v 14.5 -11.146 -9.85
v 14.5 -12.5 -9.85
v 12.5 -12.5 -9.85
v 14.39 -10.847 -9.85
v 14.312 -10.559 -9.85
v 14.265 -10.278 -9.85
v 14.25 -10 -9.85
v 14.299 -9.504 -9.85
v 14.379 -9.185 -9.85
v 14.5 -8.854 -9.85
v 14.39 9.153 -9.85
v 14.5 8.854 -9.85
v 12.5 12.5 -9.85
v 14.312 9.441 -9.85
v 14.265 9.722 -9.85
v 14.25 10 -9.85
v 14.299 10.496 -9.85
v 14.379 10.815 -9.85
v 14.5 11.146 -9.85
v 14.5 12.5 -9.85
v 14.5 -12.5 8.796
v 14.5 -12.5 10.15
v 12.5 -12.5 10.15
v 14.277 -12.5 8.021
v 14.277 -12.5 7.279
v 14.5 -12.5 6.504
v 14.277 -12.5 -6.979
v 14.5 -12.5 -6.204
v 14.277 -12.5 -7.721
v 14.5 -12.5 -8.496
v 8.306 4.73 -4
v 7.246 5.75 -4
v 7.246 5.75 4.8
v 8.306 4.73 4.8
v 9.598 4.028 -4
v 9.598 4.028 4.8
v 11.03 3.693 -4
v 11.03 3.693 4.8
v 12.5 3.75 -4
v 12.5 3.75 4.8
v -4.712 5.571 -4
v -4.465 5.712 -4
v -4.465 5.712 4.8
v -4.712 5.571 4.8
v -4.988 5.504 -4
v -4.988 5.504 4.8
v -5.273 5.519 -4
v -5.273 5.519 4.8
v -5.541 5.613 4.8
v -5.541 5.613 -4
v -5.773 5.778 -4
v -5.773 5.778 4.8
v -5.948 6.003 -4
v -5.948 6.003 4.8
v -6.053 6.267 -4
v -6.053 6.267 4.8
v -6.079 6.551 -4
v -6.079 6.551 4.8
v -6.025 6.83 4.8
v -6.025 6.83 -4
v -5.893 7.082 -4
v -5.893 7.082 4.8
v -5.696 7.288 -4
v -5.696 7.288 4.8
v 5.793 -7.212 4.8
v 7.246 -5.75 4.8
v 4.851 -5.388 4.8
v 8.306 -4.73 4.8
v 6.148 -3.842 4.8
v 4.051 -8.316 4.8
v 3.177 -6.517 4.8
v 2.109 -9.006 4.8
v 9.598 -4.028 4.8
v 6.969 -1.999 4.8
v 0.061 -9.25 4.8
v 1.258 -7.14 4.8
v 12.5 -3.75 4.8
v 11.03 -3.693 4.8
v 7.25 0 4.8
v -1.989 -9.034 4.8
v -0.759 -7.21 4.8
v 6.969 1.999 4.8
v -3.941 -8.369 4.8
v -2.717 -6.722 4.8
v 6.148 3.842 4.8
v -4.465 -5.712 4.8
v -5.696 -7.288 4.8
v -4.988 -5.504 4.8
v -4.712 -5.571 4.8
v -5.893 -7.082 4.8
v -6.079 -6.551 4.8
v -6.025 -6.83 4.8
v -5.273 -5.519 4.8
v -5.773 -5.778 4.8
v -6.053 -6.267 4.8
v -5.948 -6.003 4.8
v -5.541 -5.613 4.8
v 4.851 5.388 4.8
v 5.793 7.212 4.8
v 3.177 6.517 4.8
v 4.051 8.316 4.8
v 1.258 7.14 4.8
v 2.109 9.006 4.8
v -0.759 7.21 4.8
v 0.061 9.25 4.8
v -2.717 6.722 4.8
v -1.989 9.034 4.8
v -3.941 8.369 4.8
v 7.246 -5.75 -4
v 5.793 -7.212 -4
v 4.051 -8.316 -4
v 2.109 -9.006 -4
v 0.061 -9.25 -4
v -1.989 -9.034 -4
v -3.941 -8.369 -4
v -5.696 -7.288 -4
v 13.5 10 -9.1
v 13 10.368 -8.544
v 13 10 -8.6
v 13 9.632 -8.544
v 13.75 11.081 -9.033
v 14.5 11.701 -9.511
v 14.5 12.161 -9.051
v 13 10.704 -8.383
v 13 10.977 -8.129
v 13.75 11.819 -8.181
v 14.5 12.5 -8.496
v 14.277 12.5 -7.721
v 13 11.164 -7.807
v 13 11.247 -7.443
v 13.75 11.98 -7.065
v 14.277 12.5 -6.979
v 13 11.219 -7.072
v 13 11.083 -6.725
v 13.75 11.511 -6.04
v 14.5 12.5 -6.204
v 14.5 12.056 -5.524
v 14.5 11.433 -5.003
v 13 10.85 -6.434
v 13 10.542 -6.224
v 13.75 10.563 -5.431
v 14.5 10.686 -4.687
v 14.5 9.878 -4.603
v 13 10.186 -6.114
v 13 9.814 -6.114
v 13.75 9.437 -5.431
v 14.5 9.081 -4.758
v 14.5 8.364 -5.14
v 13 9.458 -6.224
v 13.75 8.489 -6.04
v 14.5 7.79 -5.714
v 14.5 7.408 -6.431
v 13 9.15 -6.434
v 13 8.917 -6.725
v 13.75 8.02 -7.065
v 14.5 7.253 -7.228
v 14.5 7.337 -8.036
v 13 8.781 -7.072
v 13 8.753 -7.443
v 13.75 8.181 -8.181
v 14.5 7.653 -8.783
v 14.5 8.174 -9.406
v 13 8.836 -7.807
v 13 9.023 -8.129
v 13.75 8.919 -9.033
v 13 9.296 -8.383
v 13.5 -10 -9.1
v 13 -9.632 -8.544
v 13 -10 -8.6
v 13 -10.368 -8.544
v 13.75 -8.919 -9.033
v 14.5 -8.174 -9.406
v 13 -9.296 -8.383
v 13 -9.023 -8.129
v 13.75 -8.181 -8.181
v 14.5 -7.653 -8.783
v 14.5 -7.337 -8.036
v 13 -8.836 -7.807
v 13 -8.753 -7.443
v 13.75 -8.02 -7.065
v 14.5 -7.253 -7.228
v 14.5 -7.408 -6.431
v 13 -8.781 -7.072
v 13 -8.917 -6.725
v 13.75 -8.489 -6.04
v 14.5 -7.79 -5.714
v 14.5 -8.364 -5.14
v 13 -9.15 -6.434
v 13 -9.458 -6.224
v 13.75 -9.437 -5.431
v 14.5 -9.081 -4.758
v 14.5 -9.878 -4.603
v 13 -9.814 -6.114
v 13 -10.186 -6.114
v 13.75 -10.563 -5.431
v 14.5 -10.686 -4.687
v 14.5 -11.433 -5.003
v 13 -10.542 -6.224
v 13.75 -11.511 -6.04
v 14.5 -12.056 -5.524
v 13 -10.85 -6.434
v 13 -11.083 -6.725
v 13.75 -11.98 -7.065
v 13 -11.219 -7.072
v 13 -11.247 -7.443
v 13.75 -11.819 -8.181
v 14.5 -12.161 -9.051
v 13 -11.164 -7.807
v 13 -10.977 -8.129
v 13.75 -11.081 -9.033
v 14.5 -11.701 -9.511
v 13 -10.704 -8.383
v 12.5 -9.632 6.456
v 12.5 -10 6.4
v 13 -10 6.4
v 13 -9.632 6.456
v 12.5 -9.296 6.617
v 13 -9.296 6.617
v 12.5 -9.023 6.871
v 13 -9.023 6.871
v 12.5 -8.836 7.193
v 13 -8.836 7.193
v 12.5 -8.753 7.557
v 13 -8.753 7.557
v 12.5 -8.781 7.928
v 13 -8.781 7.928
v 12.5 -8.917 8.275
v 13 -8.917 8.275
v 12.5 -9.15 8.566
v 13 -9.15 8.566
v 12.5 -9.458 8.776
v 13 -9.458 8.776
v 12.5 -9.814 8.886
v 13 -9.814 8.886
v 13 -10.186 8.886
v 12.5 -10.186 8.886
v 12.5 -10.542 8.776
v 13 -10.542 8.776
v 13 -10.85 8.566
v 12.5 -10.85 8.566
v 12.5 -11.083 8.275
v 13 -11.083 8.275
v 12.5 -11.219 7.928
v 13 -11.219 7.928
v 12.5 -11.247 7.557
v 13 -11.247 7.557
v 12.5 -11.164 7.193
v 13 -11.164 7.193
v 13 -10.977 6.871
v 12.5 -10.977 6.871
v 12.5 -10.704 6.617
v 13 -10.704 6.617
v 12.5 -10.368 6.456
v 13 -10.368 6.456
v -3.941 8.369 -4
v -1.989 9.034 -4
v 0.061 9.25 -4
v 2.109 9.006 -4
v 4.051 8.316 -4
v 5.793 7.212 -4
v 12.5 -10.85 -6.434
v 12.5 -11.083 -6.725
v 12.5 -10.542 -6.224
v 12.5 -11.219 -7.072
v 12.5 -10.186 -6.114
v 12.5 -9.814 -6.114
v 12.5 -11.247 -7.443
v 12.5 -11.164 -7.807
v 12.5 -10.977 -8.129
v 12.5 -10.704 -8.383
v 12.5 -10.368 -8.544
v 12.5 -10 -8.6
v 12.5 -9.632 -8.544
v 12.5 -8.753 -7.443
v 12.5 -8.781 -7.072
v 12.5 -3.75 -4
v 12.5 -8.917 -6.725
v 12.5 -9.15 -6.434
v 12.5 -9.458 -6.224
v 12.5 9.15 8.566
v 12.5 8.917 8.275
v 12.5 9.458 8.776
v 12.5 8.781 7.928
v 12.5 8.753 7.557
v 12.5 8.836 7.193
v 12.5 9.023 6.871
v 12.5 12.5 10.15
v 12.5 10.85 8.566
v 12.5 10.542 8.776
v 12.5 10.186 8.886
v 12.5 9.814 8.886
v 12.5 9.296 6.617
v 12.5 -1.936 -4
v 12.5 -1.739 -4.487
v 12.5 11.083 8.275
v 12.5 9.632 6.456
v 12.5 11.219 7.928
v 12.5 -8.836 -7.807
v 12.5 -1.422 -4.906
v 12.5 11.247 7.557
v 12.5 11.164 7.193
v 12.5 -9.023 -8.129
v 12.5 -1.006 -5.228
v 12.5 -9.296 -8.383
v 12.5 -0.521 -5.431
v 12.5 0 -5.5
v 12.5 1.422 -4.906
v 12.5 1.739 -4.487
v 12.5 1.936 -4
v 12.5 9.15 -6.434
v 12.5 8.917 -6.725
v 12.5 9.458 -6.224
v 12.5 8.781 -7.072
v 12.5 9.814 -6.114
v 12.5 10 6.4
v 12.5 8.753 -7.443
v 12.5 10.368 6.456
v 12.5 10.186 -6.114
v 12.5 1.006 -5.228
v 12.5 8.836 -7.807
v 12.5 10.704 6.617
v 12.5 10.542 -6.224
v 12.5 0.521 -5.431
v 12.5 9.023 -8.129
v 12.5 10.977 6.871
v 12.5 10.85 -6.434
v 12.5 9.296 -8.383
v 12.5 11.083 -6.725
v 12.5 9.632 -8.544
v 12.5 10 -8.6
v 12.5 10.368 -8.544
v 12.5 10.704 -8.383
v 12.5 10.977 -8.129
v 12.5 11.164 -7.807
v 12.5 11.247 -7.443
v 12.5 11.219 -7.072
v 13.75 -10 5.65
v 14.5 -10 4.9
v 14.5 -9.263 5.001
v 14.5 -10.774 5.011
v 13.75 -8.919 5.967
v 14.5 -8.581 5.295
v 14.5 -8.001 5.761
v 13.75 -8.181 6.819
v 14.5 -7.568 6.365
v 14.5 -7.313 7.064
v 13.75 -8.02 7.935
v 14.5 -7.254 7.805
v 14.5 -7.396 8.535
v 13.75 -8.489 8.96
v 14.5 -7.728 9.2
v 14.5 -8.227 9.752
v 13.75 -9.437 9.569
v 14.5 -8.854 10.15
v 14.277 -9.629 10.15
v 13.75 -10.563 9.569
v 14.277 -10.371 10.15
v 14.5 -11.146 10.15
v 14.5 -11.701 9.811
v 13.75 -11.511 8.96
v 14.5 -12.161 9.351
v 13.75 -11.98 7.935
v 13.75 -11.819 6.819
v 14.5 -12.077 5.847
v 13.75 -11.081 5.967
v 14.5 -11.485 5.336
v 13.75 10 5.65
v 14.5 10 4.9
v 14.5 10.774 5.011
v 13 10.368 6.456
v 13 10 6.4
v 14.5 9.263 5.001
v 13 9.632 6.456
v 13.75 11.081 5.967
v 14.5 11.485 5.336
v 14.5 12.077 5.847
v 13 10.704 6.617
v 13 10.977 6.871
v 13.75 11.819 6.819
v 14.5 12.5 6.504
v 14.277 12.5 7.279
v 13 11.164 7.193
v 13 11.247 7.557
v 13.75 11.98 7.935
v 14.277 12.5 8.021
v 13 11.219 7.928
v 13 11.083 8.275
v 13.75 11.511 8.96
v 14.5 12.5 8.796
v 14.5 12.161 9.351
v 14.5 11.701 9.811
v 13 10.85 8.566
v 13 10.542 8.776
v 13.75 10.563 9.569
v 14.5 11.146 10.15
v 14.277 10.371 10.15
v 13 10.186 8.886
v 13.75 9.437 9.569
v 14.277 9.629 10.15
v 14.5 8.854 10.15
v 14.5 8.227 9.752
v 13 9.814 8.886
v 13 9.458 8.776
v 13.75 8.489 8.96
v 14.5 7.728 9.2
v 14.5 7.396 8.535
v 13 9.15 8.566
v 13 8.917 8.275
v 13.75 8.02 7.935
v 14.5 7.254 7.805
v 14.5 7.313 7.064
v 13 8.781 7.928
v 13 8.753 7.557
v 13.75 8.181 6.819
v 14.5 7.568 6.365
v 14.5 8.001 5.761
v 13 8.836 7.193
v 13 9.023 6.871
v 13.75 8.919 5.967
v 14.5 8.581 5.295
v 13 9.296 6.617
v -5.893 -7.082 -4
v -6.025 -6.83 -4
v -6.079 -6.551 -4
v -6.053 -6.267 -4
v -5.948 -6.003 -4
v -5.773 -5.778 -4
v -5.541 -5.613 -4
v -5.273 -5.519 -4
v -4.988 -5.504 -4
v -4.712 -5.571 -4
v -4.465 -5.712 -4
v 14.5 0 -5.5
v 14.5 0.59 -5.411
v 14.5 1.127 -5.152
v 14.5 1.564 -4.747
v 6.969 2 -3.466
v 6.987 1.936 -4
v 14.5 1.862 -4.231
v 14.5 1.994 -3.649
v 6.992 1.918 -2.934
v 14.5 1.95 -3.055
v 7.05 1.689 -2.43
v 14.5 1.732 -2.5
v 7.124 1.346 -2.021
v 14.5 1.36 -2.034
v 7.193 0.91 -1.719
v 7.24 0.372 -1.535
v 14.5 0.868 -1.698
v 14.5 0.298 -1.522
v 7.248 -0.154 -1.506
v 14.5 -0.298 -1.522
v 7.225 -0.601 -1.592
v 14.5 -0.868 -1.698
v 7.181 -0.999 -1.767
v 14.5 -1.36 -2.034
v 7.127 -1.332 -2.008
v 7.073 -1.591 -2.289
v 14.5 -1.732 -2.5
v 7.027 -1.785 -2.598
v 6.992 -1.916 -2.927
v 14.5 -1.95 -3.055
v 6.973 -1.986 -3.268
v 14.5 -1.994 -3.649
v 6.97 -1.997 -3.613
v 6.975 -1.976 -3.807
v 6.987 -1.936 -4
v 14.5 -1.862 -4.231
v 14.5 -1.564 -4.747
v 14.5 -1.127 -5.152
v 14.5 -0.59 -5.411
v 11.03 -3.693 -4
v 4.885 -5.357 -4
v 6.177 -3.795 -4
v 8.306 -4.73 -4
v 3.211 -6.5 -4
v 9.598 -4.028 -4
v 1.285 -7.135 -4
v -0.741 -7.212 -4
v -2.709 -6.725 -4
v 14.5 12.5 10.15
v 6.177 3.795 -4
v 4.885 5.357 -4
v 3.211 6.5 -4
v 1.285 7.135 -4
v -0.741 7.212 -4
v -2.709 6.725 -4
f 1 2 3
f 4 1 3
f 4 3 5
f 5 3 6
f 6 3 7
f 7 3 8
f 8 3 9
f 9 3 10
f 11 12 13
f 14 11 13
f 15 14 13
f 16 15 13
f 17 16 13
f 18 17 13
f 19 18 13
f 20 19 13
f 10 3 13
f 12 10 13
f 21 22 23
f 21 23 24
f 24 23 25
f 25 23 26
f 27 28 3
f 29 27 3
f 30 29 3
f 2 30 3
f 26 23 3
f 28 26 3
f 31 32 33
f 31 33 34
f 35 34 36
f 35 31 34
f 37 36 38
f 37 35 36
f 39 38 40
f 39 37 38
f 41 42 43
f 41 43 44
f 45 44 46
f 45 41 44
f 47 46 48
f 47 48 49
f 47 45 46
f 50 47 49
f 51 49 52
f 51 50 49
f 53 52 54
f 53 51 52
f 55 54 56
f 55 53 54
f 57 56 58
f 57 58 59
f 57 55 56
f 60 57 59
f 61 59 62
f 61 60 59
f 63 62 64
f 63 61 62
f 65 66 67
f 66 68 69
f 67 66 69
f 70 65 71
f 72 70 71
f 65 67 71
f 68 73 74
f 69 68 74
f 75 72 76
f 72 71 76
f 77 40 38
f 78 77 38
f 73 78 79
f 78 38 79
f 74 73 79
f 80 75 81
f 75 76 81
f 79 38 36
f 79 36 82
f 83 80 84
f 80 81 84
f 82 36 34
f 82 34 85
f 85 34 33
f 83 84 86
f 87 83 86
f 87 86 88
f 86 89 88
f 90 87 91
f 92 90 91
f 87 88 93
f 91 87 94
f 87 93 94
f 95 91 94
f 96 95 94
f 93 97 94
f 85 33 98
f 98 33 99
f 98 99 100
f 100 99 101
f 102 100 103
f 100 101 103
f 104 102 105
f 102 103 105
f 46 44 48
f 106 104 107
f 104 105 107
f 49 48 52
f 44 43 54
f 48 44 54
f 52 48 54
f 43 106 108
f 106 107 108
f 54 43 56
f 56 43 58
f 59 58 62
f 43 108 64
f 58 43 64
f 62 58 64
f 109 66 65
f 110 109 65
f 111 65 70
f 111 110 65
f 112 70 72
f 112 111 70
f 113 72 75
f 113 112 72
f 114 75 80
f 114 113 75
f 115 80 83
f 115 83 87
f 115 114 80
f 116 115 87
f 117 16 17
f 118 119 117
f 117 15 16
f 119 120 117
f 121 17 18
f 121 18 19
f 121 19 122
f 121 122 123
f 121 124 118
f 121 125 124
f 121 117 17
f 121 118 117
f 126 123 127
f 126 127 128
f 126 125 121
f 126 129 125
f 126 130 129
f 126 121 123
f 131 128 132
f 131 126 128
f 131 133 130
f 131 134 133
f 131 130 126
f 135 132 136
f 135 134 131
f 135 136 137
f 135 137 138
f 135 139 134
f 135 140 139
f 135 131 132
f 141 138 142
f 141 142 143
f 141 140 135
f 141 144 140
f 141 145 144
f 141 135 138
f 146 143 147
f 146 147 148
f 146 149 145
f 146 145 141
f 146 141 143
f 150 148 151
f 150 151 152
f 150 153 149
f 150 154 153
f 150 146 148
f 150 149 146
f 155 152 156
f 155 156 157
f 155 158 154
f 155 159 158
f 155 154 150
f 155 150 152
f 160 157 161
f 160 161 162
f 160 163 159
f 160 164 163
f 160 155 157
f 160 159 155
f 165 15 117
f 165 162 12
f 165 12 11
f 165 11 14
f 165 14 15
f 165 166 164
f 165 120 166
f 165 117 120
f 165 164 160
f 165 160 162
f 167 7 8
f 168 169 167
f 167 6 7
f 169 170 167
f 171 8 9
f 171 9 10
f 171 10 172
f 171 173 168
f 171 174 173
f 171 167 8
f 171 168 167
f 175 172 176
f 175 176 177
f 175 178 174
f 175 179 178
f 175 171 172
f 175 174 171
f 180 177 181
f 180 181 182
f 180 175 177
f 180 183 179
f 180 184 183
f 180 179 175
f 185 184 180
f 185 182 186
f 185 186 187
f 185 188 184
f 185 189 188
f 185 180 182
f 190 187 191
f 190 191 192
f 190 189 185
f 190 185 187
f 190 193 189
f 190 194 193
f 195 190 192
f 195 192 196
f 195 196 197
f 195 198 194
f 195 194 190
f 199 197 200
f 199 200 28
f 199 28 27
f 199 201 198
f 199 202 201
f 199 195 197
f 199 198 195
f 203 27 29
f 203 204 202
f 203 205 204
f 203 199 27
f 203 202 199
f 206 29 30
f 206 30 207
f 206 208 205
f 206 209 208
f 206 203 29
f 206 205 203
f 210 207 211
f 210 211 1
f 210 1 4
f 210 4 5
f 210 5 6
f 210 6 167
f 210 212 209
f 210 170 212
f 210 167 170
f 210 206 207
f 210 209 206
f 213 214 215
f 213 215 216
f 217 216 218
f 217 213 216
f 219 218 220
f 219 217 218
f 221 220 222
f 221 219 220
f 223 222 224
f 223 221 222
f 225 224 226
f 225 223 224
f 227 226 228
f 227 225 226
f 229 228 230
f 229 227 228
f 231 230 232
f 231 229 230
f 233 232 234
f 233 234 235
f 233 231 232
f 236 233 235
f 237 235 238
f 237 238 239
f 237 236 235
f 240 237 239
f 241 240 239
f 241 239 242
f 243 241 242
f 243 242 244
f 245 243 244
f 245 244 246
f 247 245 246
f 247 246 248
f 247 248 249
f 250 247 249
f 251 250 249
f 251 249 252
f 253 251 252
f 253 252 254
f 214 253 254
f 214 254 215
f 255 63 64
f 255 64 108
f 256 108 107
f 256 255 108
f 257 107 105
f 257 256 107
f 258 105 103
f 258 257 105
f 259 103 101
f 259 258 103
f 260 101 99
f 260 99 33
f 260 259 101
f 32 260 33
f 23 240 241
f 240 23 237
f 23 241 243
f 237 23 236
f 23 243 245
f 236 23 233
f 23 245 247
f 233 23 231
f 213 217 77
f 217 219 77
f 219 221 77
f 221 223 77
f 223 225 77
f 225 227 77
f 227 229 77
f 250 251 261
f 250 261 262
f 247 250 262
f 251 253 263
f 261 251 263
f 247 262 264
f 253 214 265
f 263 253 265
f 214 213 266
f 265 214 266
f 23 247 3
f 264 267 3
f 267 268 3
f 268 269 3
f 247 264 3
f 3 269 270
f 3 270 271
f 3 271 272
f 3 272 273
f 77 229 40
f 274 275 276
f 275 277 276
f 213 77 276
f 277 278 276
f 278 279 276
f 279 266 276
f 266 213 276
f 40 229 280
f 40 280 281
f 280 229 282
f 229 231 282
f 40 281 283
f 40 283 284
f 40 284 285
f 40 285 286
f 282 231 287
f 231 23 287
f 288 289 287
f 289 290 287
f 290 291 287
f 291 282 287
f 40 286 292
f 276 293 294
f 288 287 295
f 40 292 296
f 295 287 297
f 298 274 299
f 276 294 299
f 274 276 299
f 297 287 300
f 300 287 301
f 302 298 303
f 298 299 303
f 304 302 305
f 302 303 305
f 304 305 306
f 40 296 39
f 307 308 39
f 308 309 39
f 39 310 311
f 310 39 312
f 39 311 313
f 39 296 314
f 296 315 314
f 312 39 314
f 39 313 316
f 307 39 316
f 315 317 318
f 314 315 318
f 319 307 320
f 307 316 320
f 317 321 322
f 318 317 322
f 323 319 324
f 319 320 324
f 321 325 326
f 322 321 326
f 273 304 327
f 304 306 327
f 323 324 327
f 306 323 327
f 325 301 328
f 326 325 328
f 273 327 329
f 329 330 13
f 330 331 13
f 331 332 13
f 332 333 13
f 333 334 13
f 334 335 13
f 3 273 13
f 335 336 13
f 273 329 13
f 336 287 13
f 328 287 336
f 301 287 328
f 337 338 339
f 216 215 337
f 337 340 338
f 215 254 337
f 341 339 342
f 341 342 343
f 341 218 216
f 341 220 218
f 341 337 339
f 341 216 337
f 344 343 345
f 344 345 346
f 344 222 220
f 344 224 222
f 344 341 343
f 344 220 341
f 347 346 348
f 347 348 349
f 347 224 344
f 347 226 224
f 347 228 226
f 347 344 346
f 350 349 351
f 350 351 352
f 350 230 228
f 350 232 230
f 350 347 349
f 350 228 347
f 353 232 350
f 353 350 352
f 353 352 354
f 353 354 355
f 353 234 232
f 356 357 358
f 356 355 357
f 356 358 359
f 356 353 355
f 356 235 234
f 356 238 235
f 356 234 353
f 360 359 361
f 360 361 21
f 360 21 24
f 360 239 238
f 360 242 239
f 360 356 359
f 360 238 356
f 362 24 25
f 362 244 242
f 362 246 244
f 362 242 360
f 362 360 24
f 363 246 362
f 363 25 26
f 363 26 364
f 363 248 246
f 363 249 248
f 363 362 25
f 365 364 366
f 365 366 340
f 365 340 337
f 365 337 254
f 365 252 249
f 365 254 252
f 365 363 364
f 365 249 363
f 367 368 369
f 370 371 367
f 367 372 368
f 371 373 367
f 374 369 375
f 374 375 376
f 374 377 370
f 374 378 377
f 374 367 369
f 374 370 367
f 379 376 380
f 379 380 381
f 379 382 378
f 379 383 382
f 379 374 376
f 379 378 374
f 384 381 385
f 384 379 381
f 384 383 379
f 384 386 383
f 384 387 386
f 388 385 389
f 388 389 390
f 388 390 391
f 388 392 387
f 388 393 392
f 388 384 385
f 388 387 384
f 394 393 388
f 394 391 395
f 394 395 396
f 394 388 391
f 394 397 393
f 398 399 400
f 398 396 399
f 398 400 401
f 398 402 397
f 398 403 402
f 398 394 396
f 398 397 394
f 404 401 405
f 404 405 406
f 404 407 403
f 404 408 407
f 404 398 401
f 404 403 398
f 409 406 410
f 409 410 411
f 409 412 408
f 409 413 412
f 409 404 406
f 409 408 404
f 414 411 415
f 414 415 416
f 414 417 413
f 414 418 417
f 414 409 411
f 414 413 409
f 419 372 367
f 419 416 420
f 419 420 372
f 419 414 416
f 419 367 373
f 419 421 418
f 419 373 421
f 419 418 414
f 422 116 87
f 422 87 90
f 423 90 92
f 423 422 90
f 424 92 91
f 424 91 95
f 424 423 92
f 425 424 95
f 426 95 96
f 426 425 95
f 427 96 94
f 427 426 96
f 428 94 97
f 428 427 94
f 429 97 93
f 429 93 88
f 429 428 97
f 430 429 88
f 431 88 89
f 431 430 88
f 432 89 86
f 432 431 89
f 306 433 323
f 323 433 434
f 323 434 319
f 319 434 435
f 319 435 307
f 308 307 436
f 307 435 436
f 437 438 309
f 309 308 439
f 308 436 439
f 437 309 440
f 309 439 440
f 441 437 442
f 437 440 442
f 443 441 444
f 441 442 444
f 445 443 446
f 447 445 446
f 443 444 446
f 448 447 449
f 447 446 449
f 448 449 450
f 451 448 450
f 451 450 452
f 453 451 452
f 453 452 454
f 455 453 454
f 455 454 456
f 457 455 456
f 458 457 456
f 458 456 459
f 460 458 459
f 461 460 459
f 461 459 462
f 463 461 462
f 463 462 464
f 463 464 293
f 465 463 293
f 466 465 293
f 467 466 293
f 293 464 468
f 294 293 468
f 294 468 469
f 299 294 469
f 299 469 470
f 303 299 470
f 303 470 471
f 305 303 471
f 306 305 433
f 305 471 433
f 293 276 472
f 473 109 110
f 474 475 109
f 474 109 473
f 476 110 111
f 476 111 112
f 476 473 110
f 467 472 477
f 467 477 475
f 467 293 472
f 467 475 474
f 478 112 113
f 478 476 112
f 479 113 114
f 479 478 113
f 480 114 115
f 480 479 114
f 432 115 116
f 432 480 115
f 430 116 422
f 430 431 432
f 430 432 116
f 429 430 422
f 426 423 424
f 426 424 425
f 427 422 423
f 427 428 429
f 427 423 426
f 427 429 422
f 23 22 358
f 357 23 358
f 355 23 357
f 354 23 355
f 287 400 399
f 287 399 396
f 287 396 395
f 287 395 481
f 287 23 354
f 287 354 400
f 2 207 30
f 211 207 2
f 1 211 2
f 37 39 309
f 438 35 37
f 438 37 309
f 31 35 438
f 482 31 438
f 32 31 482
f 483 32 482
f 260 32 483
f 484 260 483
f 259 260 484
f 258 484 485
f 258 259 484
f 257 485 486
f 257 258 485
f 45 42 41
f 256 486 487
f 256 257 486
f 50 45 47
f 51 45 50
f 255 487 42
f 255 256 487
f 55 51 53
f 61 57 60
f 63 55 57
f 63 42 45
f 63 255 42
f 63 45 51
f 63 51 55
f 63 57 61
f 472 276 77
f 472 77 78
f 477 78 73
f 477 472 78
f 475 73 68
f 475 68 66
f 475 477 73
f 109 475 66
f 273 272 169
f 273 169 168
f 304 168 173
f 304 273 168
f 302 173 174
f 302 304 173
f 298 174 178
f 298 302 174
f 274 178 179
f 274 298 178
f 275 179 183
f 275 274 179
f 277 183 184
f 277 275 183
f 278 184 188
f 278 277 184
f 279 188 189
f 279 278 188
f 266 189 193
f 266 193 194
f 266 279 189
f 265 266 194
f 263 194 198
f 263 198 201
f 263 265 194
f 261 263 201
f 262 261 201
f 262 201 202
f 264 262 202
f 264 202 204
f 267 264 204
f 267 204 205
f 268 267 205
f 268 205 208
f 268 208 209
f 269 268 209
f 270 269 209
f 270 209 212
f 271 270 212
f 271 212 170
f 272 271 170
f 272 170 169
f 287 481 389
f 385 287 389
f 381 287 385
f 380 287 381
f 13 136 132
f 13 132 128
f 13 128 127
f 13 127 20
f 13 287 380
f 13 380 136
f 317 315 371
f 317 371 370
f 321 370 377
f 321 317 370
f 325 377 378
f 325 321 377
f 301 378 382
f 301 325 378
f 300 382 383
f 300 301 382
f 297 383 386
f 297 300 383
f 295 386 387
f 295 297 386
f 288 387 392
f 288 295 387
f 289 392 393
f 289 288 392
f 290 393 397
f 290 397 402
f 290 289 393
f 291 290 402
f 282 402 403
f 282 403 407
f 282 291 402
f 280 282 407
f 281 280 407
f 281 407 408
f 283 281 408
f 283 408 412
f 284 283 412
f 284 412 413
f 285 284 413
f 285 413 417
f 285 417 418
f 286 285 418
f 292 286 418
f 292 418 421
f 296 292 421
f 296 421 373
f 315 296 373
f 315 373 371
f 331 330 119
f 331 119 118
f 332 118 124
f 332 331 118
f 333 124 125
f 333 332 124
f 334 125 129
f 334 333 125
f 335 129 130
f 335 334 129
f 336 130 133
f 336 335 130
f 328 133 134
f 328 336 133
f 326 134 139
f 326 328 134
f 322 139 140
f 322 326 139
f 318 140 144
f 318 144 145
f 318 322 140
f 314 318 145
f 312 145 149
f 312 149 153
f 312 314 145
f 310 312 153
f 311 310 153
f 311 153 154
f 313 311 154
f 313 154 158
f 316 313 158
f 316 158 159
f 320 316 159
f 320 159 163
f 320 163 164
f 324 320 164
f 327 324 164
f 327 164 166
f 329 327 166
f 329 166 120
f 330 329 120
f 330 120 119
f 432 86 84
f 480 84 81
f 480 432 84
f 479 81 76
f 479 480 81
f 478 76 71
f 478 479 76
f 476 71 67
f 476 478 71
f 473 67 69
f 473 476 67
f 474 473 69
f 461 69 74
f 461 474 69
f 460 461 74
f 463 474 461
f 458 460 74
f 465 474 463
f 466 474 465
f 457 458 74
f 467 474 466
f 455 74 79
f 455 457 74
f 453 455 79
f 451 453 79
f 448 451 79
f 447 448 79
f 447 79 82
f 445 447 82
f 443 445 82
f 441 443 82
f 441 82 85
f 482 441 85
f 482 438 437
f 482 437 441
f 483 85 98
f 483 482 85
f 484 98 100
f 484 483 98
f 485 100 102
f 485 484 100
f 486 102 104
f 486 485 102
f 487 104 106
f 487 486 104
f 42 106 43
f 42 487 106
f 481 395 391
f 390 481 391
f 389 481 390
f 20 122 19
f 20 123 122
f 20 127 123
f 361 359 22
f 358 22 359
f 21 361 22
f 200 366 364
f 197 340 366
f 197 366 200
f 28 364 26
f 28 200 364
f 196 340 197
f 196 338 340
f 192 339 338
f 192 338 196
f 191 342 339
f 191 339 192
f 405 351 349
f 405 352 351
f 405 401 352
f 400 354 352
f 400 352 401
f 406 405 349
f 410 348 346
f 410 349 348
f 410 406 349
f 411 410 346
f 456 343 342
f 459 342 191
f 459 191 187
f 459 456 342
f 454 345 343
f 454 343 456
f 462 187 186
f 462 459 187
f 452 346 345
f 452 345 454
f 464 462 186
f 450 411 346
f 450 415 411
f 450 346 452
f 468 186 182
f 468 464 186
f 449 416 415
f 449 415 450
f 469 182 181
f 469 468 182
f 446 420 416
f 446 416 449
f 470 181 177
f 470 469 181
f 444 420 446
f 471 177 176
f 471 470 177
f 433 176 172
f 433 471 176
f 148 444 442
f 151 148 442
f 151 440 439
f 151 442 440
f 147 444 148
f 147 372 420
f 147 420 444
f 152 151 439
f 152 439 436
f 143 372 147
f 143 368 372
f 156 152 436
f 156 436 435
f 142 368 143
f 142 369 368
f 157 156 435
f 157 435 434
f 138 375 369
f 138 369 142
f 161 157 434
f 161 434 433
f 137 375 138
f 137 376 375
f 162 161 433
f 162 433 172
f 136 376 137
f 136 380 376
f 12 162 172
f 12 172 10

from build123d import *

# Parameters (mm, degrees)
EXTRUDE_5_DEPTH        = 4.8
EXTRUDE_5_DEPTH_BACK   = 4
EXTRUDE_START          = -4
EXTRUDE_902_DEPTH      = 8.8
SKETCH_8_W             = 20
SKETCH_8_H             = 25
SKETCH_8_R             = 1.25
EXTRUDE_2674_DEPTH     = 2
CHAMFER_2_SIZE         = 1.5
CUT_EXTRUDE_2965_REACH = 28.131
SKETCH_9_R             = 2


with BuildPart() as part:
    # Эскиз1 → Выталкивающая часть (С ПАЗАМИ В ОБЕ СТОРОНЫ ВЫДАВИТЬ НА 5ММ) (new, two sides: drawn at the far end of the back side and taken through both)
    with BuildSketch(Plane.XY.offset(-EXTRUDE_5_DEPTH_BACK)):
        with BuildLine():
            ThreePointArc((-4.464770012, -5.712121212), (7.25, 0), (-4.464770012, 5.712121212))
            ThreePointArc((-4.464770012, 5.712121212), (-5.868479146, 5.884169654), (-5.696430705, 7.287878788))
            ThreePointArc((-5.696430705, 7.287878788), (9.25, 0), (-5.696430705, -7.287878788))
            ThreePointArc((-5.696430705, -7.287878788), (-5.868479146, -5.884169654), (-4.464770012, -5.712121212))
        make_face()
    extrude(amount=EXTRUDE_5_DEPTH + EXTRUDE_5_DEPTH_BACK)

    # Эскиз2 → Extrude 902 (add)
    with BuildSketch(Plane.XY.offset(EXTRUDE_START)):
        with BuildLine():
            Line((12.5, 3.75), (12.5, -3.75))
            ThreePointArc((12.5, -3.75), (9.598284348, -4.027802018), (7.246080423, -5.749505936))
            ThreePointArc((7.246080423, -5.749505936), (9.25, 0), (7.246080423, 5.749505936))
            ThreePointArc((7.246080423, 5.749505936), (9.598284348, 4.027802018), (12.5, 3.75))
        make_face()
    extrude(amount=EXTRUDE_902_DEPTH)

    # Эскиз8 → Extrude 2674 (add)
    with BuildSketch(Plane(origin=(12.5, 0, 0), x_dir=(0, 0, -1), z_dir=(1, 0, 0))):
        with Locations((-0.15, 0)):
            Rectangle(SKETCH_8_W, SKETCH_8_H)
        with Locations((-7.65, 10)):
            Circle(SKETCH_8_R, mode=Mode.SUBTRACT)
        with Locations((-7.65, -10)):
            Circle(SKETCH_8_R, mode=Mode.SUBTRACT)
        with Locations((7.35, -10)):
            Circle(SKETCH_8_R, mode=Mode.SUBTRACT)
        with Locations((7.35, 10)):
            Circle(SKETCH_8_R, mode=Mode.SUBTRACT)
    extrude(amount=EXTRUDE_2674_DEPTH)

    # Фаска2
    # the kernel refuses this chamfer: 1.5 mm, written as the material it takes off along each edge
    with BuildSketch(Plane(origin=(14.5, -10, -7.35), x_dir=(0, 0, -1), z_dir=(0, -1, 0))) as chamfer_2_piece_1:
        Polygon((1.25 + CHAMFER_2_SIZE, 0), (1.25, -CHAMFER_2_SIZE), (1.25, 0), align=None)
    revolve(axis=Axis((14.5, -10, -7.35), (1, 0, 0)), mode=Mode.SUBTRACT)
    with BuildSketch(Plane(origin=(14.5, 10, 7.65), x_dir=(0, 0, -1), z_dir=(0, -1, 0))) as chamfer_2_piece_2:
        Polygon((1.25 + CHAMFER_2_SIZE, 0), (1.25, -CHAMFER_2_SIZE), (1.25, 0), align=None)
    revolve(axis=Axis((14.5, 10, 7.65), (1, 0, 0)), mode=Mode.SUBTRACT)
    with BuildSketch(Plane(origin=(14.5, -10, 7.65), x_dir=(0, 0, -1), z_dir=(0, -1, 0))) as chamfer_2_piece_3:
        Polygon((1.25 + CHAMFER_2_SIZE, 0), (1.25, -CHAMFER_2_SIZE), (1.25, 0), align=None)
    revolve(axis=Axis((14.5, -10, 7.65), (1, 0, 0)), mode=Mode.SUBTRACT)
    with BuildSketch(Plane(origin=(14.5, 10, -7.35), x_dir=(0, 0, -1), z_dir=(0, -1, 0))) as chamfer_2_piece_4:
        Polygon((1.25 + CHAMFER_2_SIZE, 0), (1.25, -CHAMFER_2_SIZE), (1.25, 0), align=None)
    revolve(axis=Axis((14.5, 10, -7.35), (1, 0, 0)), mode=Mode.SUBTRACT)

    # Эскиз9 → Cut-Extrude 2965 (cut, up to next)
    with BuildSketch(Plane(origin=(14.5, 0, 0), x_dir=(0, 0, -1), z_dir=(1, 0, 0)), mode=Mode.PRIVATE) as cut_extrude_2965_sk1:
        with Locations((3.5, 0)):
            Circle(SKETCH_9_R)
    cut_extrude_2965_tool1 = extrude(cut_extrude_2965_sk1.sketch, amount=-CUT_EXTRUDE_2965_REACH, mode=Mode.PRIVATE) & part.part
    add(cut_extrude_2965_tool1.solids().sort_by_distance((14.5, 0, -3.5))[0], mode=Mode.SUBTRACT)


solid = part.part
